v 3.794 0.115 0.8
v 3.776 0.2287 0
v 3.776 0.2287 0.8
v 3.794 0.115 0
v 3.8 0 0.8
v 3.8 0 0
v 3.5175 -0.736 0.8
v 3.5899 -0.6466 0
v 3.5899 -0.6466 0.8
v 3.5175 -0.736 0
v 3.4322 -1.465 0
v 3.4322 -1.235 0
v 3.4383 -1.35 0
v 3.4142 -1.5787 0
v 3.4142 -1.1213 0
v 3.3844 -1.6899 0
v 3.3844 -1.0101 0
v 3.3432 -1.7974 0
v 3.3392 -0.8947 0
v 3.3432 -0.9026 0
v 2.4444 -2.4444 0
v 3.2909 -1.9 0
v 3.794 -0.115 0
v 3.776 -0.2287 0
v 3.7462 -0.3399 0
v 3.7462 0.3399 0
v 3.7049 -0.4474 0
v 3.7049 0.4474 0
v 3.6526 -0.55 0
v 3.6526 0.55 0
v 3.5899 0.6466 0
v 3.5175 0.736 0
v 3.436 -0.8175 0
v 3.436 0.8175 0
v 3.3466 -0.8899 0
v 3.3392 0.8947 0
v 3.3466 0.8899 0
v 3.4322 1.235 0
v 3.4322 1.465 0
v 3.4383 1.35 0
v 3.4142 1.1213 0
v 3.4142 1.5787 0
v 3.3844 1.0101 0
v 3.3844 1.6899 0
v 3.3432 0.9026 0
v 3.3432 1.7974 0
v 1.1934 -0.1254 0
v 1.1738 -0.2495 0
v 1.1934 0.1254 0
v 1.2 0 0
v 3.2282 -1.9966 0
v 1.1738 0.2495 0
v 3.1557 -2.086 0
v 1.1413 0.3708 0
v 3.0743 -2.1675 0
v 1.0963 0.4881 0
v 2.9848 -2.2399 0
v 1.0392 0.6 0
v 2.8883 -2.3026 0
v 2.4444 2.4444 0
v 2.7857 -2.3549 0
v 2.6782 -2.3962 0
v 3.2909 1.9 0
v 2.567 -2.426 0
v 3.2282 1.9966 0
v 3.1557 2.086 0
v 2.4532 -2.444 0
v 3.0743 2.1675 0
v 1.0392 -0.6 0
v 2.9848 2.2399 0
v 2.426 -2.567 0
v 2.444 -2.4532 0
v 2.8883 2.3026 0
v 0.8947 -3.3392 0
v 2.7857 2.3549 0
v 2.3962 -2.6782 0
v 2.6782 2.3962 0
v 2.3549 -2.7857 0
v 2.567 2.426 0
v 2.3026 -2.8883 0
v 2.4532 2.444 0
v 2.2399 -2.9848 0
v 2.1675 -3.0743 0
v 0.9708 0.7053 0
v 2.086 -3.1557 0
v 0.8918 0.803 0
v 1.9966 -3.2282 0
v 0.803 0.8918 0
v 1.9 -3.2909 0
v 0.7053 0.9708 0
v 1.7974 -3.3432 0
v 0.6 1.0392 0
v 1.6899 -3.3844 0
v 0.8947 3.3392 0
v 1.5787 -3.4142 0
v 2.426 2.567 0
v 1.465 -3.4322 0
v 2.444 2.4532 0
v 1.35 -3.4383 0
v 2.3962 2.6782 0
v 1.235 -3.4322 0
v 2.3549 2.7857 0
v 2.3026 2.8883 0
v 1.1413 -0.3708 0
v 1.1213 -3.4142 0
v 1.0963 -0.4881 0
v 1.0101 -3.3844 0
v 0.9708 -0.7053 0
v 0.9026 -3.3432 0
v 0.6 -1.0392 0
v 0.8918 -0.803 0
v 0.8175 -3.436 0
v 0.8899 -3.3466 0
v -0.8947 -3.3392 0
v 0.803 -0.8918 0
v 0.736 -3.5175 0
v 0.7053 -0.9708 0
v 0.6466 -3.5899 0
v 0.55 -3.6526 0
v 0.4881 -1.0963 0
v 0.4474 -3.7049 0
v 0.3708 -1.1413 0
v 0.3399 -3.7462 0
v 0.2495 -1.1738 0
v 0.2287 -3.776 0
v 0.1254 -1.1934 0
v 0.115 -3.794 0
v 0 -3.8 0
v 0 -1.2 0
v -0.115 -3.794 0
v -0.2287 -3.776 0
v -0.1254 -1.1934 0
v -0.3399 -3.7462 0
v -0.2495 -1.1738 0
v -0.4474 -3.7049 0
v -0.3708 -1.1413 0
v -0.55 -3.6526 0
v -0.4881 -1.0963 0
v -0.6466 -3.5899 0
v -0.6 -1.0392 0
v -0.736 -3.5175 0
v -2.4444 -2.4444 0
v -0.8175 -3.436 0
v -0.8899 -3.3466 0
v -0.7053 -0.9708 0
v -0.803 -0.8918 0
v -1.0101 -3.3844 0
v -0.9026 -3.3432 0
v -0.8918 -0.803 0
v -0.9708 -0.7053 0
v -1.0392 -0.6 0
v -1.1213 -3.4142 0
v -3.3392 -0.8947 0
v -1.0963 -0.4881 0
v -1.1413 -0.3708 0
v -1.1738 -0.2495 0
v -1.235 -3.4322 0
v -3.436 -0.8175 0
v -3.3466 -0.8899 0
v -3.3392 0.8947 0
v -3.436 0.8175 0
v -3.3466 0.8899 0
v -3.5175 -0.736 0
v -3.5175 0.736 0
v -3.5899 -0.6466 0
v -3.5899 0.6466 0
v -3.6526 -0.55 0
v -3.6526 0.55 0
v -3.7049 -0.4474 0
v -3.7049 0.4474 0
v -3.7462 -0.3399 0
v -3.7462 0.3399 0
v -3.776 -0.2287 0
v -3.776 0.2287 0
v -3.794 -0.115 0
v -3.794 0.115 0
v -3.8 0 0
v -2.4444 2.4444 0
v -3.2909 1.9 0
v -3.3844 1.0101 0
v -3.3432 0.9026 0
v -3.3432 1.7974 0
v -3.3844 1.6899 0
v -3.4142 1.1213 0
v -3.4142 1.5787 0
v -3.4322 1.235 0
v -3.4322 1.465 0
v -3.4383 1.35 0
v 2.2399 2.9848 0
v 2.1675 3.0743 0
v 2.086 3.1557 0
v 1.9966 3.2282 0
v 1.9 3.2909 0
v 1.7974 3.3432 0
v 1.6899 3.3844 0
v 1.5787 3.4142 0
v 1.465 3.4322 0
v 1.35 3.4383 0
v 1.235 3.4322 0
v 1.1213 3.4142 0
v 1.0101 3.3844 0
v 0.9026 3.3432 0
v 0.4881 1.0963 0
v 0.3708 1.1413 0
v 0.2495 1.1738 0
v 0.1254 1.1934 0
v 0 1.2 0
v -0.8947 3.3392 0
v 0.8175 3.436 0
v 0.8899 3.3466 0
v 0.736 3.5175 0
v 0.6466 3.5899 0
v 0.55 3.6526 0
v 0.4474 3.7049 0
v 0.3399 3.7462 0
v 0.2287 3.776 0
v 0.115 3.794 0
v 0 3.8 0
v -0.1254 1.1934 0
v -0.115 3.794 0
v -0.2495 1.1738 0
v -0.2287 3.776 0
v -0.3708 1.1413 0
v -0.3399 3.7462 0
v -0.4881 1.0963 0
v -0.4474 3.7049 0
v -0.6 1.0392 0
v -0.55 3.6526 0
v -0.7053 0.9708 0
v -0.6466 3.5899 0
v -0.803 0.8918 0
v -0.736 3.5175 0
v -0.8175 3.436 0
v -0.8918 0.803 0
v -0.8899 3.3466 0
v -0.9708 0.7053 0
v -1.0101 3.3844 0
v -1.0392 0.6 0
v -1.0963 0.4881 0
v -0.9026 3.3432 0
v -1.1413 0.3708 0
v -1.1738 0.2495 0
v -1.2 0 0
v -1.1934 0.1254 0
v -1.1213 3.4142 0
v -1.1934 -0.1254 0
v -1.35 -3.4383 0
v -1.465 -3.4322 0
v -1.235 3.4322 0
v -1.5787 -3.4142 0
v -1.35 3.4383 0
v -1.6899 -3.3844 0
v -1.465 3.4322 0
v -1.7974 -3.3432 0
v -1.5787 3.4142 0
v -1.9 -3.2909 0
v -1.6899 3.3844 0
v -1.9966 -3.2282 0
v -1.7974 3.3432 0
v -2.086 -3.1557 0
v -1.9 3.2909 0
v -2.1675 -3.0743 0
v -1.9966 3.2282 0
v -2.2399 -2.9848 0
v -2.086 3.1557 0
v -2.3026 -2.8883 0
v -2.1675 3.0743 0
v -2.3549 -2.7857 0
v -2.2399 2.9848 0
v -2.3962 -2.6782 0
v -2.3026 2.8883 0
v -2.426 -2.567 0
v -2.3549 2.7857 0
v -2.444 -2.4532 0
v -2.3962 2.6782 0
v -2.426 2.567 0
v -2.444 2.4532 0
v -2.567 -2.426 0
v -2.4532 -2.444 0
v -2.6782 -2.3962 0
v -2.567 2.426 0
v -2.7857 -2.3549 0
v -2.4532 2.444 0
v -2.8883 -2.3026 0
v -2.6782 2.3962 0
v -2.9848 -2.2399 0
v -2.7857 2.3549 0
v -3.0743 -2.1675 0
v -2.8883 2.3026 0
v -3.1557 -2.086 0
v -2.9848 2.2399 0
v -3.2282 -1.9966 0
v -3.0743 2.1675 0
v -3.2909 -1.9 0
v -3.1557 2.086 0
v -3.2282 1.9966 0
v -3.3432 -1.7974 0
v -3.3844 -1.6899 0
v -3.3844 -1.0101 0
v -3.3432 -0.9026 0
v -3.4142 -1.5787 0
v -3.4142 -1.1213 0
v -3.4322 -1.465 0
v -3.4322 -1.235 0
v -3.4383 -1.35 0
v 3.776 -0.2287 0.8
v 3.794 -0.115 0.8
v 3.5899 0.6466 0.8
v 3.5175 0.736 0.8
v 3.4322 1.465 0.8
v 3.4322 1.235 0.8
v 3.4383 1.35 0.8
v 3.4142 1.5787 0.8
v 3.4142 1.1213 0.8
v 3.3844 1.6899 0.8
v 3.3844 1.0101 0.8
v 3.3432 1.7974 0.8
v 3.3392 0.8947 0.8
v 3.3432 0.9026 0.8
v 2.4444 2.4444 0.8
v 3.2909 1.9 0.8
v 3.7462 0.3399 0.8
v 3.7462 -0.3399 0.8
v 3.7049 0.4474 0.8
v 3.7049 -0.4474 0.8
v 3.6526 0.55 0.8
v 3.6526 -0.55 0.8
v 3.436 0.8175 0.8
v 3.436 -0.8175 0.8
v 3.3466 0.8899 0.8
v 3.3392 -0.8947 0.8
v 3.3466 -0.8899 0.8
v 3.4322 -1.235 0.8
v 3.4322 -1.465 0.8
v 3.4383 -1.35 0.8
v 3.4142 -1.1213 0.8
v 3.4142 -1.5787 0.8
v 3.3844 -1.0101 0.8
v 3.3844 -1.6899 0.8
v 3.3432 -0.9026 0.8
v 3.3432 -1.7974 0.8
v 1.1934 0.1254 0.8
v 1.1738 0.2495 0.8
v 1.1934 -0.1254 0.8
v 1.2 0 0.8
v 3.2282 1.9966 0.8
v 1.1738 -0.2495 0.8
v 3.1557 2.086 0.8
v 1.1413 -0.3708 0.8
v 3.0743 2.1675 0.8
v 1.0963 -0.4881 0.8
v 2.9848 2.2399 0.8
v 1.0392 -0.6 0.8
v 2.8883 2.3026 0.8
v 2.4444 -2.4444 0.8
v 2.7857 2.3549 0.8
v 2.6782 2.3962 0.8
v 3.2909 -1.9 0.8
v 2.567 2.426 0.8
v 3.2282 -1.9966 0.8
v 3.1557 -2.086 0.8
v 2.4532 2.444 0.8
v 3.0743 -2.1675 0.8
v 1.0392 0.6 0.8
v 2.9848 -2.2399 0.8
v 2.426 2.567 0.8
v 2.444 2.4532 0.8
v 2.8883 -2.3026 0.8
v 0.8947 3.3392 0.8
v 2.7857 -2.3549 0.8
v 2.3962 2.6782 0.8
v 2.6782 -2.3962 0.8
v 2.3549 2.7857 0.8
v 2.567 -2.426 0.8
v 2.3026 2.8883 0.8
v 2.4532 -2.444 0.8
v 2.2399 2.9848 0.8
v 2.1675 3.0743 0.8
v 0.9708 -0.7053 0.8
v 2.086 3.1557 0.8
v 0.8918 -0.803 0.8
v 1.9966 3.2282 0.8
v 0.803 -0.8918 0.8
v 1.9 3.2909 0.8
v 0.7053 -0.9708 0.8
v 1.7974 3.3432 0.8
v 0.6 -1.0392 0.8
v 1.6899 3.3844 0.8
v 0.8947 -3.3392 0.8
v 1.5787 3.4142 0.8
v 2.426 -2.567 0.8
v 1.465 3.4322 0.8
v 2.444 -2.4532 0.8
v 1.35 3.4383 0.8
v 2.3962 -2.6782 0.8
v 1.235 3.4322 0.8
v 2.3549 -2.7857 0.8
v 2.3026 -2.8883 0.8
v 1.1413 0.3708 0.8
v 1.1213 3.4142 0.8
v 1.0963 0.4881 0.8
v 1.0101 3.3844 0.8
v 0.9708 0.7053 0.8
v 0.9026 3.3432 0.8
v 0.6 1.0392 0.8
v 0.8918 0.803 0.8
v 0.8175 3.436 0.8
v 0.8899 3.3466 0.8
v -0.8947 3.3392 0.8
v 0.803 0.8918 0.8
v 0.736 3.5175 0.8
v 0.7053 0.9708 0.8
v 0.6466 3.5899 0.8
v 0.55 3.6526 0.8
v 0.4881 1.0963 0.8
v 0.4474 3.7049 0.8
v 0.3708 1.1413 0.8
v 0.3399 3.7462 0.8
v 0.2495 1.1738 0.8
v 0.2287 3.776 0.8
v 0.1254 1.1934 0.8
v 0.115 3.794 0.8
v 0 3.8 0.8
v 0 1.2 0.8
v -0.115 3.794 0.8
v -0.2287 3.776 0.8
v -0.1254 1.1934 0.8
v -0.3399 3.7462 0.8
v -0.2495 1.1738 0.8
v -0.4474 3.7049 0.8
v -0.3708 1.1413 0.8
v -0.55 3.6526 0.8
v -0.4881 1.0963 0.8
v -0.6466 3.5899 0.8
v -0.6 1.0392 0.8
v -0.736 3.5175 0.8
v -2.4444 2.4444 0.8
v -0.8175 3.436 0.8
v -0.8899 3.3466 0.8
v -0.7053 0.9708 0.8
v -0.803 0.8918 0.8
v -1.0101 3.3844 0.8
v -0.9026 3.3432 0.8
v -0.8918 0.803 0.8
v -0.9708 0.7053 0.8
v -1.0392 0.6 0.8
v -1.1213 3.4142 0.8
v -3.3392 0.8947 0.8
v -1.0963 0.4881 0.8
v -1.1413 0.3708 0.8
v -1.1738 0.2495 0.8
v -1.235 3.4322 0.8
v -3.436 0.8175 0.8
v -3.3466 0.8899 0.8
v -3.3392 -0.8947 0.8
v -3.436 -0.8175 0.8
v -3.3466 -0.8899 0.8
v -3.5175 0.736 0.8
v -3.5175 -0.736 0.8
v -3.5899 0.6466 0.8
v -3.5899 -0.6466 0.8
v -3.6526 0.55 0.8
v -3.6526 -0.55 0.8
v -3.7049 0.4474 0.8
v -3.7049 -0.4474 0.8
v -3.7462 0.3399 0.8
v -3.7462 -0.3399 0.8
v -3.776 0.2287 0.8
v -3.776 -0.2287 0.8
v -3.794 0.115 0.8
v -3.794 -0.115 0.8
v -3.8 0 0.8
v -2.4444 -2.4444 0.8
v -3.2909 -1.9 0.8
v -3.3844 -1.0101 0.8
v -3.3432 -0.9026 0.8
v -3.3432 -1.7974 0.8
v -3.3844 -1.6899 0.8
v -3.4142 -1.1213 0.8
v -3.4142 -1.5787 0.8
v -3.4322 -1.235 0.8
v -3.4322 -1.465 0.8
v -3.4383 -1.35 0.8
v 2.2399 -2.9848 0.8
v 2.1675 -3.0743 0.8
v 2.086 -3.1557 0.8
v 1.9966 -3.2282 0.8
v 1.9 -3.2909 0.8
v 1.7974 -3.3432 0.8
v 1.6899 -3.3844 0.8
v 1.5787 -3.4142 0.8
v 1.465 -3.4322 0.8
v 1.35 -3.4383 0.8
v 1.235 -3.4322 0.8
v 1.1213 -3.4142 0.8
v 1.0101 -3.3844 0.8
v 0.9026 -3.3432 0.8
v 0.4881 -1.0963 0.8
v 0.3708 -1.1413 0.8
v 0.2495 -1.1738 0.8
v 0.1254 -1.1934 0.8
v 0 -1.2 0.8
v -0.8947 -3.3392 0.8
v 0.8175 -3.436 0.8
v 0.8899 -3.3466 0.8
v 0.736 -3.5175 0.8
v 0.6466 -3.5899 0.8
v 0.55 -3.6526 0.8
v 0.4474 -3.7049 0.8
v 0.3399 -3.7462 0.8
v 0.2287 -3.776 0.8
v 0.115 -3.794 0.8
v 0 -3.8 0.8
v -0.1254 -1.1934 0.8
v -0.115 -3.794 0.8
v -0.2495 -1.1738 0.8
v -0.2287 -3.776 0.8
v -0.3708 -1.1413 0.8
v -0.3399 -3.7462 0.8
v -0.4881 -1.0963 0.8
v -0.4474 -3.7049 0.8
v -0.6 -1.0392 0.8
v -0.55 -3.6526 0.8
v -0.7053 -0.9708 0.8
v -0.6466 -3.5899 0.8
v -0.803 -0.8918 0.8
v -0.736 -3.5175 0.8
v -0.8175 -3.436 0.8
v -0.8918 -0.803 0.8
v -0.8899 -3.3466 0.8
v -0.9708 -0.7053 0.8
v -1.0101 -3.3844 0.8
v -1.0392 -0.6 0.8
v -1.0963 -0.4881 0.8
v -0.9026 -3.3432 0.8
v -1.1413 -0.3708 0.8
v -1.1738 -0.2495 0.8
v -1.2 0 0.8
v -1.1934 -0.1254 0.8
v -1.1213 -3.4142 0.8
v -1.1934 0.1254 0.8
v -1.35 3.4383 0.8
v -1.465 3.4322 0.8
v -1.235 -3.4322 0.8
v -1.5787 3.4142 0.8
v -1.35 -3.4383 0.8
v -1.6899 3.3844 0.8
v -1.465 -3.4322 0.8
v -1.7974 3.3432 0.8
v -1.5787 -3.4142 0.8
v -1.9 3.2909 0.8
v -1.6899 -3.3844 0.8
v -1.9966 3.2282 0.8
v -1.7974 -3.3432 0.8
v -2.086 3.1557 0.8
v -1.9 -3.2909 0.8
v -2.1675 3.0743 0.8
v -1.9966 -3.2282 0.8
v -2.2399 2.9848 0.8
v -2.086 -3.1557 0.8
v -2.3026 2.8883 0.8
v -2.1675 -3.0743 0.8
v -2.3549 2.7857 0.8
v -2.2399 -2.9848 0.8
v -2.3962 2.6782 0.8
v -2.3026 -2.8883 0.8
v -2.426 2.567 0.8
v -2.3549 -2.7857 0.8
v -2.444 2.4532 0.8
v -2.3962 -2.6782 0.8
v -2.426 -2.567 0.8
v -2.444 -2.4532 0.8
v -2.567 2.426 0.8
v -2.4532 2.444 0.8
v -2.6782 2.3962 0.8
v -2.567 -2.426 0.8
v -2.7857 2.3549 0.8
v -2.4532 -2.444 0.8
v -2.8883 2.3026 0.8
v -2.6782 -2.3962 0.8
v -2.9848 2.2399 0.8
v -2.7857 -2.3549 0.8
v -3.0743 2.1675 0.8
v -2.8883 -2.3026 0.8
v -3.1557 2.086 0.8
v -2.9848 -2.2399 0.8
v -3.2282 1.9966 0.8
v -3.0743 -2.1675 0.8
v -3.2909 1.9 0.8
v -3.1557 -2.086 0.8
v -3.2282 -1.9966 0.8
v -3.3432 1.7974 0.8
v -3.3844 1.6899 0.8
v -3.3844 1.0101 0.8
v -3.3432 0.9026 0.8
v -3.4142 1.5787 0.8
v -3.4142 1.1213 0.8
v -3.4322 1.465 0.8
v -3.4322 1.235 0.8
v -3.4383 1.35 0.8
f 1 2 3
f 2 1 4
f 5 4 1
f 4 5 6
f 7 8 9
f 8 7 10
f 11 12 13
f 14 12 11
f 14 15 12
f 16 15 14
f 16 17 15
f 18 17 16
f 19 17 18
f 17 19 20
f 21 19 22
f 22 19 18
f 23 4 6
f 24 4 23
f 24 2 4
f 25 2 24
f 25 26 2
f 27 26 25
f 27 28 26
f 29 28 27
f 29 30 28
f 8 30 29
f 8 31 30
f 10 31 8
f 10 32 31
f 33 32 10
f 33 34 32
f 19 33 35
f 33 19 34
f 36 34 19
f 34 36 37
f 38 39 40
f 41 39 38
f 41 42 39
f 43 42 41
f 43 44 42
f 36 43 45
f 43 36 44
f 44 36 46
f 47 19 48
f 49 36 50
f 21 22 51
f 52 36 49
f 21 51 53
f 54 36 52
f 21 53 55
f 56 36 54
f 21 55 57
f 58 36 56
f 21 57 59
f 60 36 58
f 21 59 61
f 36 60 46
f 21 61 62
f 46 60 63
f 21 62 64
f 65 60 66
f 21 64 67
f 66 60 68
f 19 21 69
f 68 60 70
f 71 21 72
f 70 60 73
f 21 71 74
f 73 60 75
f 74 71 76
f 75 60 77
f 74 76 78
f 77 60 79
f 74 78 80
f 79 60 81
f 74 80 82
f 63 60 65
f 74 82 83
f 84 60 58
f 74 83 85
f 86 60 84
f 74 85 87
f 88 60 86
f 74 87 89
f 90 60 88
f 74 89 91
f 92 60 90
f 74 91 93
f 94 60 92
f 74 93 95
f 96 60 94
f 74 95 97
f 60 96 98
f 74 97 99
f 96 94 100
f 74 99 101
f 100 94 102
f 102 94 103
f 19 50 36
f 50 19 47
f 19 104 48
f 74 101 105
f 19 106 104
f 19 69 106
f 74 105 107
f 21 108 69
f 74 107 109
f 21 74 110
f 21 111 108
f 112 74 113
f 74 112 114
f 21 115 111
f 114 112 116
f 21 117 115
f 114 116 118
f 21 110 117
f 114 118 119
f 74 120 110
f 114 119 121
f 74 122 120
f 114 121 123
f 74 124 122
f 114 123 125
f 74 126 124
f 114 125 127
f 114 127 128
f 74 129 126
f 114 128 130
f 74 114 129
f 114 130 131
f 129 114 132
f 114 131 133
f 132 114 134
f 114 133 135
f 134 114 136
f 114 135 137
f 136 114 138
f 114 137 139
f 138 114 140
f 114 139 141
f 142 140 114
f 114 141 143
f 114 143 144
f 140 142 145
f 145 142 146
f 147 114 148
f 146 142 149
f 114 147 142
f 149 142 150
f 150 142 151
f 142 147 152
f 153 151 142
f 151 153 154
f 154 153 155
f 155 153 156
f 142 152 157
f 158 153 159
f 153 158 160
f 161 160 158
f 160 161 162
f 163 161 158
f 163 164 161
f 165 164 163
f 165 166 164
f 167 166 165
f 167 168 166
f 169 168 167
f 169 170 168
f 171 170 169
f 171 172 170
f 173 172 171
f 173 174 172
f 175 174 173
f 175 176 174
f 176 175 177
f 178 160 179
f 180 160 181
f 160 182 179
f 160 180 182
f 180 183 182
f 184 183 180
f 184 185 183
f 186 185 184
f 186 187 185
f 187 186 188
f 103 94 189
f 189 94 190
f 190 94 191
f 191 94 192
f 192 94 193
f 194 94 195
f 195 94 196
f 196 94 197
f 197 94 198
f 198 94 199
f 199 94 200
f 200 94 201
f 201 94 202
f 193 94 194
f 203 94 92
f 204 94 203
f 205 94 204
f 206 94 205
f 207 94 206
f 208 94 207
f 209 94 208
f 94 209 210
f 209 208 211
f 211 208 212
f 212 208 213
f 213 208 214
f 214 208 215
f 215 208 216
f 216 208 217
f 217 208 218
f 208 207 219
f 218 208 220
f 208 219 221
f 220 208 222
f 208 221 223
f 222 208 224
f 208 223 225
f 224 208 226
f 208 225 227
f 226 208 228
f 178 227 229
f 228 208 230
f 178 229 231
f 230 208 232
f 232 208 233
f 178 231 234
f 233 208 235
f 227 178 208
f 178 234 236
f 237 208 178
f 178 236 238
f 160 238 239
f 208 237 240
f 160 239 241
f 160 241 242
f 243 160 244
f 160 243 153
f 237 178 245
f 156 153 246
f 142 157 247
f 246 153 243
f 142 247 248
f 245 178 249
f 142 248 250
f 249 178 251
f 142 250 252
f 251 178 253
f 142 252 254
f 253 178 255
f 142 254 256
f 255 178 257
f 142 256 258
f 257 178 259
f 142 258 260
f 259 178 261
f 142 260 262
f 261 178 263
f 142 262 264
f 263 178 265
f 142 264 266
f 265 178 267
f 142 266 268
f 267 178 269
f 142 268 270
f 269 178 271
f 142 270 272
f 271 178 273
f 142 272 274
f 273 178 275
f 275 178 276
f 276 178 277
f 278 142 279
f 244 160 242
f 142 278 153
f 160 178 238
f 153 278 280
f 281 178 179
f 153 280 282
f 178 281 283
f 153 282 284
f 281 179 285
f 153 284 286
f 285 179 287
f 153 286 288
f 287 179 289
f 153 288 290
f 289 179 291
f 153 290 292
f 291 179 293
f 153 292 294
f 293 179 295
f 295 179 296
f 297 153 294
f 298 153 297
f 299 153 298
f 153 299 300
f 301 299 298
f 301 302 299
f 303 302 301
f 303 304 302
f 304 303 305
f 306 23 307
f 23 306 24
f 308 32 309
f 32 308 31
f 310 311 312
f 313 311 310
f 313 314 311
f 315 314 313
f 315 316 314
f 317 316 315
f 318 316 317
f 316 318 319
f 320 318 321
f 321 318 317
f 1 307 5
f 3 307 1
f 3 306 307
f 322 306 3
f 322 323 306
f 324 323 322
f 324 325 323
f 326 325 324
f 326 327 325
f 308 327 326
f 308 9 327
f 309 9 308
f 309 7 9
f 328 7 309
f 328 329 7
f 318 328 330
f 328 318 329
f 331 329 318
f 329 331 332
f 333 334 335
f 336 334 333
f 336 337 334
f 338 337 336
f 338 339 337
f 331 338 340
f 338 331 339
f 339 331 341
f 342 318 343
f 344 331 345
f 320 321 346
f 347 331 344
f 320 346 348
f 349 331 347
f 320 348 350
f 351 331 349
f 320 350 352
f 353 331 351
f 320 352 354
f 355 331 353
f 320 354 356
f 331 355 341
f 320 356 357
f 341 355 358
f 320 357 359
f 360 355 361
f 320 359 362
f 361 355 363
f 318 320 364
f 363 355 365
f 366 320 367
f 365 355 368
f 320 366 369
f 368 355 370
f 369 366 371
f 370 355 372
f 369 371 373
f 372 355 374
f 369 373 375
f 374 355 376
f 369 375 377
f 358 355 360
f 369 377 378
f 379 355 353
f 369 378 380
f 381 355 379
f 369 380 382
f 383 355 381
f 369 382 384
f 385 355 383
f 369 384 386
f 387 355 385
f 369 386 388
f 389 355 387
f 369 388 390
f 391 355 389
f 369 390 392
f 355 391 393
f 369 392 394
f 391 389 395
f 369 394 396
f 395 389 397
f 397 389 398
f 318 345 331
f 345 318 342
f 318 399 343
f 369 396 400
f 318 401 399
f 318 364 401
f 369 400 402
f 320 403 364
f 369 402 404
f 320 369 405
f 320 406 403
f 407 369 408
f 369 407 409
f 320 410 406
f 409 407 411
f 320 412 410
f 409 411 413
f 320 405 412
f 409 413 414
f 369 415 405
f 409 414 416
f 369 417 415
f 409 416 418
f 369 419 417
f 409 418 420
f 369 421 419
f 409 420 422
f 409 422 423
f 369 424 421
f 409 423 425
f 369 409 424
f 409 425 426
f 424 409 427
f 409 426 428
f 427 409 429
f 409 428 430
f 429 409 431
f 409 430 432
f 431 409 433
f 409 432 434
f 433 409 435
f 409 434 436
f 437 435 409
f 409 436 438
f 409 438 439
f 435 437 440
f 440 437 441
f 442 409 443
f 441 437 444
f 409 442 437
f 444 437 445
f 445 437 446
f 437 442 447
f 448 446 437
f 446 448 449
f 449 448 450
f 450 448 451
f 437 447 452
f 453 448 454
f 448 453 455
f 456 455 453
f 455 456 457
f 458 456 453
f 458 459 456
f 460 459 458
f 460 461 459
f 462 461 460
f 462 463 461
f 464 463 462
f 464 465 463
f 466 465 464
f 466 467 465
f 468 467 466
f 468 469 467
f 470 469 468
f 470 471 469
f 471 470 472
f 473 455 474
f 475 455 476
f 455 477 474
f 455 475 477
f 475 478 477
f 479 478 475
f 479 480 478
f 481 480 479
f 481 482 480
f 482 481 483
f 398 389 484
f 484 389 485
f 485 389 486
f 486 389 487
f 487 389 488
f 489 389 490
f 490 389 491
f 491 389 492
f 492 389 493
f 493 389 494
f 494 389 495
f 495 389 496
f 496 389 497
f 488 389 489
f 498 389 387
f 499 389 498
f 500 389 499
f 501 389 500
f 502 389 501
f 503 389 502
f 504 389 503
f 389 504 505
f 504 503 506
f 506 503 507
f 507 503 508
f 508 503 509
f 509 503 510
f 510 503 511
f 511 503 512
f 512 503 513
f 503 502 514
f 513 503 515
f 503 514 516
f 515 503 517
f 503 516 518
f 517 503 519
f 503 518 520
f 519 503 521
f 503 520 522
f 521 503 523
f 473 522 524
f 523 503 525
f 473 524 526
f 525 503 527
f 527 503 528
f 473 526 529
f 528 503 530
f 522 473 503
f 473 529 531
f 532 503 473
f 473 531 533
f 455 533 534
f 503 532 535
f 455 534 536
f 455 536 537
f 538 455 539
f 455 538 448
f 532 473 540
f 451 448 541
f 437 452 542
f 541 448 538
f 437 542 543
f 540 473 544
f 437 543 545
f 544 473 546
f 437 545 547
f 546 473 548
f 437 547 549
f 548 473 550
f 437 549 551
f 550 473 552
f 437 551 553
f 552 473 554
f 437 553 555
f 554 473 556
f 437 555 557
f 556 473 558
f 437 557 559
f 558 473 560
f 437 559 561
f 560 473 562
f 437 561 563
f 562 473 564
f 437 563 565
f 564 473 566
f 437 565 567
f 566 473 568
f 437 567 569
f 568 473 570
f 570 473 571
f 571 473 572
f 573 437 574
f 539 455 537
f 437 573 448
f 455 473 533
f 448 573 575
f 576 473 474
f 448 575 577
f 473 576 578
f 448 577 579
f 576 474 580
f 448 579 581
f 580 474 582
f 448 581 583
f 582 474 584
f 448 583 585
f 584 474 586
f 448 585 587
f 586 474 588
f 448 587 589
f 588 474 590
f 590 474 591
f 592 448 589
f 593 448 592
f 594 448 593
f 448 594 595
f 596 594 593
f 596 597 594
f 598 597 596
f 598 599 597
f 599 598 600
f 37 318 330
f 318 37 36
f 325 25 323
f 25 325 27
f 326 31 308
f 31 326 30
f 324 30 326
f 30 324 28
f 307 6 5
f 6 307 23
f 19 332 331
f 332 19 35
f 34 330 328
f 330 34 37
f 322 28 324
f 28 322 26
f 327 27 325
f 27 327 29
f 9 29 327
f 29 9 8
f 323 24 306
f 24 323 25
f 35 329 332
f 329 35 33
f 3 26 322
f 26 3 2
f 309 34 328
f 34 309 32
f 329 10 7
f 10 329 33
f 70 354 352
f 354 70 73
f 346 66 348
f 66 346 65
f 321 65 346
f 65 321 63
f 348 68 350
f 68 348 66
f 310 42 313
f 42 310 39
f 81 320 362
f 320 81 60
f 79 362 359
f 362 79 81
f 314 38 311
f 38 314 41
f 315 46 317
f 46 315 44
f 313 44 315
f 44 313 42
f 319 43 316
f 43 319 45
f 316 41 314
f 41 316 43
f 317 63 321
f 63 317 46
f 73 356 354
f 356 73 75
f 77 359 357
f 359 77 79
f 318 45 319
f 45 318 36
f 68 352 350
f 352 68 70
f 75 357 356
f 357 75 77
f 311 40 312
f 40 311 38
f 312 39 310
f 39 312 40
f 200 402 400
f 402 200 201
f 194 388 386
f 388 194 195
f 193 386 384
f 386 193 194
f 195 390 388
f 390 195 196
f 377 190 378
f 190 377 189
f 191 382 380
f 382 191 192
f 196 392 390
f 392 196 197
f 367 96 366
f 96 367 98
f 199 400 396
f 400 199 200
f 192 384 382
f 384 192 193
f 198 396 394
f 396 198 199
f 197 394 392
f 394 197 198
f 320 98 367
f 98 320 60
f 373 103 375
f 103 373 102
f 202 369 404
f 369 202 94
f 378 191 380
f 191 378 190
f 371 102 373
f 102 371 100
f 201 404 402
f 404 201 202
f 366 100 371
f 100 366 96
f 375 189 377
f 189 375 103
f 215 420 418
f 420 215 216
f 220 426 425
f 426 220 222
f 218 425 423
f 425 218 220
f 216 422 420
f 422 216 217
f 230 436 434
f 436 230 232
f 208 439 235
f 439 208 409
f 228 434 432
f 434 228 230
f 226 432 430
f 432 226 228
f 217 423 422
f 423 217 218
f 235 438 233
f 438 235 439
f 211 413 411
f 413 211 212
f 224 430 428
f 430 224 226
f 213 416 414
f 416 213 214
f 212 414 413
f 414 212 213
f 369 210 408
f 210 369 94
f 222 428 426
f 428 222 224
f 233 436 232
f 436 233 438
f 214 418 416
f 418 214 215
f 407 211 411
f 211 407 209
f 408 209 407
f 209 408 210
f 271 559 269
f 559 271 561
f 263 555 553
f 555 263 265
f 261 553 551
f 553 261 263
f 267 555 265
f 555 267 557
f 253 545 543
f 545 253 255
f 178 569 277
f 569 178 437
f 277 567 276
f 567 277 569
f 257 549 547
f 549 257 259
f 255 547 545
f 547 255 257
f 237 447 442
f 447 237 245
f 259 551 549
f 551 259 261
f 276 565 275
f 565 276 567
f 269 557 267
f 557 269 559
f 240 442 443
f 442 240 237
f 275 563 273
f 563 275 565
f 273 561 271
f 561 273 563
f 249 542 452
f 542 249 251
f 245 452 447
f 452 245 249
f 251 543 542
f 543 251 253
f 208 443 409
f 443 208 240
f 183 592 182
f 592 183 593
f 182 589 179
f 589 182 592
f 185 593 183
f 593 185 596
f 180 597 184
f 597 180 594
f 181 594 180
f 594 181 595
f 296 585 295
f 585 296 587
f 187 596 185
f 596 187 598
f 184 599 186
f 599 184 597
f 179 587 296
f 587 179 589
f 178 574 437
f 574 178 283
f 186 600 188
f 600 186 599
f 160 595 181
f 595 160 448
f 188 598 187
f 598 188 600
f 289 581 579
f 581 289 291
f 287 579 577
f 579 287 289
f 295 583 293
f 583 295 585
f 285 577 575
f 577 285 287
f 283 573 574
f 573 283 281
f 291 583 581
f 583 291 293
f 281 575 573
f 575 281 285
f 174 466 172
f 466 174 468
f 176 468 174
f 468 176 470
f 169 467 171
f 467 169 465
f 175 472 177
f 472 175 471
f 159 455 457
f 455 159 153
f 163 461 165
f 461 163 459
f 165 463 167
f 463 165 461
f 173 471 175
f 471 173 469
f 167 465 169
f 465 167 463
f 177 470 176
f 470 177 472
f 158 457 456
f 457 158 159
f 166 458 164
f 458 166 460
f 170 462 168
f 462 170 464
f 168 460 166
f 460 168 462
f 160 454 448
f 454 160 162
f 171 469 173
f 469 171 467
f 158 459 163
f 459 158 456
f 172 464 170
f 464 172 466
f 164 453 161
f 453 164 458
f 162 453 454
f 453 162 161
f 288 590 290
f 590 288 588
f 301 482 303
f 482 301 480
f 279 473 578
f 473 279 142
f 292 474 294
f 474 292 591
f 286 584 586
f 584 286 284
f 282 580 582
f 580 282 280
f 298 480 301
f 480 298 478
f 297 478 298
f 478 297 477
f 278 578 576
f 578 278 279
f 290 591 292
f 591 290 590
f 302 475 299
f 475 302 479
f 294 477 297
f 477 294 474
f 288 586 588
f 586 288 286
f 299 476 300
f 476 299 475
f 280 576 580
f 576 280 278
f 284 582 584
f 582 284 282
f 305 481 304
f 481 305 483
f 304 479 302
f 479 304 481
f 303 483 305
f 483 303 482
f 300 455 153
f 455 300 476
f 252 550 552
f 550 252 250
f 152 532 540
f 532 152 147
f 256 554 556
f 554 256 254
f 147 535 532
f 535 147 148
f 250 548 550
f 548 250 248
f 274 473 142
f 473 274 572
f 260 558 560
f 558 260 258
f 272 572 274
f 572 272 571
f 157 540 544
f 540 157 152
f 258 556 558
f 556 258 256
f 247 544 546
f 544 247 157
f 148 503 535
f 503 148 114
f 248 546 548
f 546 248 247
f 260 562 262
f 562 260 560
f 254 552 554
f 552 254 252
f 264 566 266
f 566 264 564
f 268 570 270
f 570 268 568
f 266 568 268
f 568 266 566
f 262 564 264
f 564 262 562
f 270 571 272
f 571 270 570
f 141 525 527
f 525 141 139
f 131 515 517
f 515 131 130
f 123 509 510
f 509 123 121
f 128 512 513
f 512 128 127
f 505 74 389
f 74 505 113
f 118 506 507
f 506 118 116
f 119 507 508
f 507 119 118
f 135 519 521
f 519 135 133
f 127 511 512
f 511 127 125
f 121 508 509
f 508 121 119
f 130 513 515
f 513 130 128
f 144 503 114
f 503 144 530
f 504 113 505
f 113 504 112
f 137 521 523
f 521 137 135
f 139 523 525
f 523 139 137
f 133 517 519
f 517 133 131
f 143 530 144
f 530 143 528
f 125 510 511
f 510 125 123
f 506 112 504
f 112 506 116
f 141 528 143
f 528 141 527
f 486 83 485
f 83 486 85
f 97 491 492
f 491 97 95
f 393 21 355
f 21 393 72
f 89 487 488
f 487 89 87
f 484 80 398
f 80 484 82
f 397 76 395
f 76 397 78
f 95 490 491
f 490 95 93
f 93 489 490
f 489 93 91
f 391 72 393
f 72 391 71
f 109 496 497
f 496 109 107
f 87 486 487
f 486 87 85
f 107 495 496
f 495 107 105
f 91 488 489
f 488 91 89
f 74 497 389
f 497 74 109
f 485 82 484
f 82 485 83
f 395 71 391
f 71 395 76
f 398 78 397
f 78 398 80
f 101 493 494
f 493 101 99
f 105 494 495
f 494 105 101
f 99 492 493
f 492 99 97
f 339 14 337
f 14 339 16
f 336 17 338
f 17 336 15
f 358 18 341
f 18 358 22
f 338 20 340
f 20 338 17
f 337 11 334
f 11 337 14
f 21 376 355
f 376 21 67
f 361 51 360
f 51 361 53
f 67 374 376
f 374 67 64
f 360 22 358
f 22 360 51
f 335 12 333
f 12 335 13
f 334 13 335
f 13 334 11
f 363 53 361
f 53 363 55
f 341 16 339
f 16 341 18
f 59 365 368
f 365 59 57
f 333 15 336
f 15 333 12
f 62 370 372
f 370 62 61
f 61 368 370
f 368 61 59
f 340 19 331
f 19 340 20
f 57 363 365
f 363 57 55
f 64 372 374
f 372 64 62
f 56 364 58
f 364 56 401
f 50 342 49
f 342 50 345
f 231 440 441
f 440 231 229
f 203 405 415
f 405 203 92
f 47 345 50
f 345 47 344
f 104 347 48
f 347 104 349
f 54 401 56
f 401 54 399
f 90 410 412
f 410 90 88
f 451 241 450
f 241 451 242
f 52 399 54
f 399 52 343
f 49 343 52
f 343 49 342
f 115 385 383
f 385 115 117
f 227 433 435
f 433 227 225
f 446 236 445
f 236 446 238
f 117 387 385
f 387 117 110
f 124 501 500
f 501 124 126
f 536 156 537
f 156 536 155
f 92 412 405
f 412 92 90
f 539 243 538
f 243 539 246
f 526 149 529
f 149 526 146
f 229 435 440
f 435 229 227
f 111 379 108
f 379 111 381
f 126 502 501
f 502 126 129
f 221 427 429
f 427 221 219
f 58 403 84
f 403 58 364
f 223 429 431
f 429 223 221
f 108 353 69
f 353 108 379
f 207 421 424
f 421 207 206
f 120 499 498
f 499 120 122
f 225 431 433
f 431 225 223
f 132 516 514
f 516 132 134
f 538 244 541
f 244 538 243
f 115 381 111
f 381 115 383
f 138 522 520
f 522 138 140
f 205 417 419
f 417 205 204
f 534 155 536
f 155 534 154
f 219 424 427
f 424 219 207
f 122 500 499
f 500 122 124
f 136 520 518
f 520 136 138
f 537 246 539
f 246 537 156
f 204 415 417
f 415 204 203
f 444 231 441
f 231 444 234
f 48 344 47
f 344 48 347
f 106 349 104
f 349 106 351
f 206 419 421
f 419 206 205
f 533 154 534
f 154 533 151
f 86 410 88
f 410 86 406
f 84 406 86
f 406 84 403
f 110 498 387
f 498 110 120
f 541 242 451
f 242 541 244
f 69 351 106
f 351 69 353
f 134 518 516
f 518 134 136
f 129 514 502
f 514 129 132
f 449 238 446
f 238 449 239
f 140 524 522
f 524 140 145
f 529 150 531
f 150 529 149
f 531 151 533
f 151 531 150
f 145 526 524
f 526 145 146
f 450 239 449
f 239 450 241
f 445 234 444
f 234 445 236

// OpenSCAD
// External-serrated lock washer.
$fn = 60;
eps = 0.02;
inner_d = 2.4;
outer_d = 7;
thickness = 0.8;
teeth = 12;
difference() {
    union() {
        cylinder(d=outer_d-1.2,h=thickness);
        for(i=[0:teeth-1]) rotate([0,0,i*360/teeth]) translate([outer_d/2-0.8,0,0]) cylinder(d=2.2,h=thickness);
    }
    translate([0,0,-eps]) cylinder(d=inner_d,h=thickness+2*eps);
}
